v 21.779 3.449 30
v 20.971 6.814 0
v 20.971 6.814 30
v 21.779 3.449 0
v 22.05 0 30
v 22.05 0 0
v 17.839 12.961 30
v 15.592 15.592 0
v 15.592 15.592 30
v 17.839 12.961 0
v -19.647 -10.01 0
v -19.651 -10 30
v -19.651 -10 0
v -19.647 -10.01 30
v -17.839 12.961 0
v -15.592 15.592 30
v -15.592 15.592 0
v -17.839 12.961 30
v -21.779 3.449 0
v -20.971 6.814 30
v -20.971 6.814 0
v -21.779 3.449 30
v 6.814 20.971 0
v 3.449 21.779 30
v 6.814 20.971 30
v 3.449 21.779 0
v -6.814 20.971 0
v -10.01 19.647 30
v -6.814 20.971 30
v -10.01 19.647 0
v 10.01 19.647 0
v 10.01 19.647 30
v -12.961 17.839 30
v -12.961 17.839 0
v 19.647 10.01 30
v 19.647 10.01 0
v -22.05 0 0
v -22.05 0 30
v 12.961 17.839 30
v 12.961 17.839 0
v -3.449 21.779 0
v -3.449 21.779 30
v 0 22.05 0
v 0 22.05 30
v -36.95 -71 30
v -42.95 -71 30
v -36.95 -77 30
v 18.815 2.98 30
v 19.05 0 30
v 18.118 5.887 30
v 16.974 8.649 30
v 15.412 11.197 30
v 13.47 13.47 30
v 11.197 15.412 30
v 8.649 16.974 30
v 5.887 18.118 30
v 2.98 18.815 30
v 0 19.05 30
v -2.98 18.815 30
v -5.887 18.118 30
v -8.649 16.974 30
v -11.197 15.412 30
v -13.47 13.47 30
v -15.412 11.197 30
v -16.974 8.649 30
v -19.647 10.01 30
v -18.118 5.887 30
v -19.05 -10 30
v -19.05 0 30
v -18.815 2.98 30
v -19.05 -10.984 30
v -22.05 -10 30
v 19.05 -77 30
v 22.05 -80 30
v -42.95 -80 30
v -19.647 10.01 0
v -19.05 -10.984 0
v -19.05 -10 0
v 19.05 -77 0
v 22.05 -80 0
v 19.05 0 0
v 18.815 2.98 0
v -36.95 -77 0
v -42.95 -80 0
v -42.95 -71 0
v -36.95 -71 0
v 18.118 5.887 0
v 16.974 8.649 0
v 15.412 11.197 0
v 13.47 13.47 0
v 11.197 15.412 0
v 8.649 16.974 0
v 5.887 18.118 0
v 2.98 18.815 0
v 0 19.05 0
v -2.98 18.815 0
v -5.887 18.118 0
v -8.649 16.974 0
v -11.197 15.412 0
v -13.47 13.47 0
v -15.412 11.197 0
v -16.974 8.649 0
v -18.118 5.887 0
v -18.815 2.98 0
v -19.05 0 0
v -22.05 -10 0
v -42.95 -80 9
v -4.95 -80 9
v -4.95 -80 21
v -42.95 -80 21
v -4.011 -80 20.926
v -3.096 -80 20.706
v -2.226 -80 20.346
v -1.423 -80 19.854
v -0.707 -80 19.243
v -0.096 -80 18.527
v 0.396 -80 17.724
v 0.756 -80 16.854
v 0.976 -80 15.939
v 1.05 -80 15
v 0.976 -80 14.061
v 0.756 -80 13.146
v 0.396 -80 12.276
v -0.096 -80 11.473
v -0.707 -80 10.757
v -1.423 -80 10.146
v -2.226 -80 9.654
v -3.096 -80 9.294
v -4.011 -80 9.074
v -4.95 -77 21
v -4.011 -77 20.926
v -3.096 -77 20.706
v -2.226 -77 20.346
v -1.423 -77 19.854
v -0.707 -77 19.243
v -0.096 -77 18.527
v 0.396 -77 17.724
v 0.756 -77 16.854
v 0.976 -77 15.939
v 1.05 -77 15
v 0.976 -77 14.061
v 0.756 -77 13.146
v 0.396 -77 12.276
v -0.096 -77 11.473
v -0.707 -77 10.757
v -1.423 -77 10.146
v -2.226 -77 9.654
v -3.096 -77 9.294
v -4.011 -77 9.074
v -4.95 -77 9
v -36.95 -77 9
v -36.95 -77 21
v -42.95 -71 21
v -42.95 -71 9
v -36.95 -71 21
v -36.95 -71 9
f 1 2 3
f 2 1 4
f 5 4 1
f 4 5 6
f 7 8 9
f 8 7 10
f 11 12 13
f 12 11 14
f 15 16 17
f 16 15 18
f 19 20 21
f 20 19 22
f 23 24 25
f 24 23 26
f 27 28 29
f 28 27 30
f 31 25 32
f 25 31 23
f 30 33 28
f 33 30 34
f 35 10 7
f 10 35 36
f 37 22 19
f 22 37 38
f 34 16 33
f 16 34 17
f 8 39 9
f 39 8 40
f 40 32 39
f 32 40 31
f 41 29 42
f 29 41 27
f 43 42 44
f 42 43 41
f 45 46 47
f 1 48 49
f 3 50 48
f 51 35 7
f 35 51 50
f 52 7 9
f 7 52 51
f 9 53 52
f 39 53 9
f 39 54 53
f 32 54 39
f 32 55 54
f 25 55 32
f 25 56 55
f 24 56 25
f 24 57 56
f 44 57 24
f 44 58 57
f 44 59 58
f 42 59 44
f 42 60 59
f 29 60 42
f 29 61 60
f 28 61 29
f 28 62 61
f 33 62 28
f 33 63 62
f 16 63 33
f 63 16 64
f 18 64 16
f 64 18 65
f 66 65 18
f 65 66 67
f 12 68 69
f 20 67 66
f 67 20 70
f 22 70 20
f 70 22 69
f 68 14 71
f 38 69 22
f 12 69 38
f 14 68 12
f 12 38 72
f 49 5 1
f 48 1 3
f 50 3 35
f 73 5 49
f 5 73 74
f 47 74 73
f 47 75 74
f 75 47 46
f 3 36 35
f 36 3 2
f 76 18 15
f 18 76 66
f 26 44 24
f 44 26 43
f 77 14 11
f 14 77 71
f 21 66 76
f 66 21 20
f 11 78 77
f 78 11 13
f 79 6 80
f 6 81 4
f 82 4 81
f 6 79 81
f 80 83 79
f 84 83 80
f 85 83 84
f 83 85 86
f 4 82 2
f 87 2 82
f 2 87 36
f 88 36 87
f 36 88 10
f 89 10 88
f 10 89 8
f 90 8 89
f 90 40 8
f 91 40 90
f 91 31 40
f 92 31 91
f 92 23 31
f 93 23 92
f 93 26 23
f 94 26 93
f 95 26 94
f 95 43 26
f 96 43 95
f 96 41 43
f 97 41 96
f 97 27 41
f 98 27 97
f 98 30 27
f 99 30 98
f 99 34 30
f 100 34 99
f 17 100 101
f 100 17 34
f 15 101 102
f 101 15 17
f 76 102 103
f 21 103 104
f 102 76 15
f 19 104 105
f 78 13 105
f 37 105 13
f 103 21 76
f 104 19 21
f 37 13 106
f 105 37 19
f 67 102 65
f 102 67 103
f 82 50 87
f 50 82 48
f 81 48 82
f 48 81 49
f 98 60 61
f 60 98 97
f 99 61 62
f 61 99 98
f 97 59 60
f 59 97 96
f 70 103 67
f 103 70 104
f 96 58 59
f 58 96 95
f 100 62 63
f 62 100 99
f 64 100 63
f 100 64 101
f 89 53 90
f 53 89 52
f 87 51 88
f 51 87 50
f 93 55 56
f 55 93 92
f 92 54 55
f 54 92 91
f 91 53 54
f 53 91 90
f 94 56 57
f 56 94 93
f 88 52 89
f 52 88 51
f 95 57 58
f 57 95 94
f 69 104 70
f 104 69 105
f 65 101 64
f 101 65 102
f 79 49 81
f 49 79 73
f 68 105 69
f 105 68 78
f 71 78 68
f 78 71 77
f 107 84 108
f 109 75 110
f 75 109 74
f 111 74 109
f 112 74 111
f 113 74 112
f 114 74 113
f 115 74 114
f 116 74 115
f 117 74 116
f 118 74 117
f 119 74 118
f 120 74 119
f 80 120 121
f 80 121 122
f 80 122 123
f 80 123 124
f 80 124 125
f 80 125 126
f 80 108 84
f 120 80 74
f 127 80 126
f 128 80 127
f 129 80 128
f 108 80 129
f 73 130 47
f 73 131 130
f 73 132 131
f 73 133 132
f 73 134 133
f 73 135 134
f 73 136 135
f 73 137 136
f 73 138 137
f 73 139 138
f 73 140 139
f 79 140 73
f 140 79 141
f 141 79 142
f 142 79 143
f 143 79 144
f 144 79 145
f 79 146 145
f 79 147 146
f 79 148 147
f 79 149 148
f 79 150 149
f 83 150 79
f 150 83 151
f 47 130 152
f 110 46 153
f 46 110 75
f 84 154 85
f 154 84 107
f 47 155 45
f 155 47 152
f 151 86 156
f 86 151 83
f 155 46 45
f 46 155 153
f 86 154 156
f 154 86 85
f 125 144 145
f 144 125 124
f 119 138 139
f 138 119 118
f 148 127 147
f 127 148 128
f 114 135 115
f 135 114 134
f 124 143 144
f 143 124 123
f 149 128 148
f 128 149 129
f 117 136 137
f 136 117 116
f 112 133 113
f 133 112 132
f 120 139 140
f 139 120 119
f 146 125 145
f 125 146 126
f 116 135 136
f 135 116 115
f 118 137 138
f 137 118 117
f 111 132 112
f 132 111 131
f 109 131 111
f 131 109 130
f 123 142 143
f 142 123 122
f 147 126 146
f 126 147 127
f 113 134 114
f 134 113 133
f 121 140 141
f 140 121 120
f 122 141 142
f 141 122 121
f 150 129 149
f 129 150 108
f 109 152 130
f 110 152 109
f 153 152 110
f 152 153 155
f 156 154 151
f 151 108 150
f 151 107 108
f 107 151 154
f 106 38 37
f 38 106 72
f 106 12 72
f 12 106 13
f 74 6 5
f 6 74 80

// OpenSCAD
$fn = 40;
height = 30;

diameter = 25.4*1.5;
thickness = 6;

difference() {
  cylinder(h = height, d = diameter + thickness);
  cylinder(h = height, d = diameter);
  translate([0, -diameter/2, height/2])
    cube([diameter, diameter, height], center = true);
}

//  translate([0, -diameter/2, height/2])
//    cube([diameter, diameter, height], center = true);

translate([-(diameter + thickness)/2, -10, 0])
  cube([thickness/2, 10, height]);

translate([diameter/2, -80, 0])
  cube([thickness/2, 80, height]);

front_offset = 38;
back_offset = 24;
tapo_stem_diameter = 12;

translate([-front_offset-back_offset+diameter/2, -80+thickness/2, 0]) {
  rotate([90, 0, 0]) {
    difference() {
      union() {
        cube([front_offset + back_offset, height, thickness/2]);
        translate([0, 0, -thickness])
          cube([thickness, height, thickness]);
      }
      translate([front_offset, height/2, 0])
        cylinder(h = thickness, d = tapo_stem_diameter);
        translate([0, (height-tapo_stem_diameter)/2, -thickness])
        cube([front_offset, tapo_stem_diameter, thickness*2]);
    }

  }
}
